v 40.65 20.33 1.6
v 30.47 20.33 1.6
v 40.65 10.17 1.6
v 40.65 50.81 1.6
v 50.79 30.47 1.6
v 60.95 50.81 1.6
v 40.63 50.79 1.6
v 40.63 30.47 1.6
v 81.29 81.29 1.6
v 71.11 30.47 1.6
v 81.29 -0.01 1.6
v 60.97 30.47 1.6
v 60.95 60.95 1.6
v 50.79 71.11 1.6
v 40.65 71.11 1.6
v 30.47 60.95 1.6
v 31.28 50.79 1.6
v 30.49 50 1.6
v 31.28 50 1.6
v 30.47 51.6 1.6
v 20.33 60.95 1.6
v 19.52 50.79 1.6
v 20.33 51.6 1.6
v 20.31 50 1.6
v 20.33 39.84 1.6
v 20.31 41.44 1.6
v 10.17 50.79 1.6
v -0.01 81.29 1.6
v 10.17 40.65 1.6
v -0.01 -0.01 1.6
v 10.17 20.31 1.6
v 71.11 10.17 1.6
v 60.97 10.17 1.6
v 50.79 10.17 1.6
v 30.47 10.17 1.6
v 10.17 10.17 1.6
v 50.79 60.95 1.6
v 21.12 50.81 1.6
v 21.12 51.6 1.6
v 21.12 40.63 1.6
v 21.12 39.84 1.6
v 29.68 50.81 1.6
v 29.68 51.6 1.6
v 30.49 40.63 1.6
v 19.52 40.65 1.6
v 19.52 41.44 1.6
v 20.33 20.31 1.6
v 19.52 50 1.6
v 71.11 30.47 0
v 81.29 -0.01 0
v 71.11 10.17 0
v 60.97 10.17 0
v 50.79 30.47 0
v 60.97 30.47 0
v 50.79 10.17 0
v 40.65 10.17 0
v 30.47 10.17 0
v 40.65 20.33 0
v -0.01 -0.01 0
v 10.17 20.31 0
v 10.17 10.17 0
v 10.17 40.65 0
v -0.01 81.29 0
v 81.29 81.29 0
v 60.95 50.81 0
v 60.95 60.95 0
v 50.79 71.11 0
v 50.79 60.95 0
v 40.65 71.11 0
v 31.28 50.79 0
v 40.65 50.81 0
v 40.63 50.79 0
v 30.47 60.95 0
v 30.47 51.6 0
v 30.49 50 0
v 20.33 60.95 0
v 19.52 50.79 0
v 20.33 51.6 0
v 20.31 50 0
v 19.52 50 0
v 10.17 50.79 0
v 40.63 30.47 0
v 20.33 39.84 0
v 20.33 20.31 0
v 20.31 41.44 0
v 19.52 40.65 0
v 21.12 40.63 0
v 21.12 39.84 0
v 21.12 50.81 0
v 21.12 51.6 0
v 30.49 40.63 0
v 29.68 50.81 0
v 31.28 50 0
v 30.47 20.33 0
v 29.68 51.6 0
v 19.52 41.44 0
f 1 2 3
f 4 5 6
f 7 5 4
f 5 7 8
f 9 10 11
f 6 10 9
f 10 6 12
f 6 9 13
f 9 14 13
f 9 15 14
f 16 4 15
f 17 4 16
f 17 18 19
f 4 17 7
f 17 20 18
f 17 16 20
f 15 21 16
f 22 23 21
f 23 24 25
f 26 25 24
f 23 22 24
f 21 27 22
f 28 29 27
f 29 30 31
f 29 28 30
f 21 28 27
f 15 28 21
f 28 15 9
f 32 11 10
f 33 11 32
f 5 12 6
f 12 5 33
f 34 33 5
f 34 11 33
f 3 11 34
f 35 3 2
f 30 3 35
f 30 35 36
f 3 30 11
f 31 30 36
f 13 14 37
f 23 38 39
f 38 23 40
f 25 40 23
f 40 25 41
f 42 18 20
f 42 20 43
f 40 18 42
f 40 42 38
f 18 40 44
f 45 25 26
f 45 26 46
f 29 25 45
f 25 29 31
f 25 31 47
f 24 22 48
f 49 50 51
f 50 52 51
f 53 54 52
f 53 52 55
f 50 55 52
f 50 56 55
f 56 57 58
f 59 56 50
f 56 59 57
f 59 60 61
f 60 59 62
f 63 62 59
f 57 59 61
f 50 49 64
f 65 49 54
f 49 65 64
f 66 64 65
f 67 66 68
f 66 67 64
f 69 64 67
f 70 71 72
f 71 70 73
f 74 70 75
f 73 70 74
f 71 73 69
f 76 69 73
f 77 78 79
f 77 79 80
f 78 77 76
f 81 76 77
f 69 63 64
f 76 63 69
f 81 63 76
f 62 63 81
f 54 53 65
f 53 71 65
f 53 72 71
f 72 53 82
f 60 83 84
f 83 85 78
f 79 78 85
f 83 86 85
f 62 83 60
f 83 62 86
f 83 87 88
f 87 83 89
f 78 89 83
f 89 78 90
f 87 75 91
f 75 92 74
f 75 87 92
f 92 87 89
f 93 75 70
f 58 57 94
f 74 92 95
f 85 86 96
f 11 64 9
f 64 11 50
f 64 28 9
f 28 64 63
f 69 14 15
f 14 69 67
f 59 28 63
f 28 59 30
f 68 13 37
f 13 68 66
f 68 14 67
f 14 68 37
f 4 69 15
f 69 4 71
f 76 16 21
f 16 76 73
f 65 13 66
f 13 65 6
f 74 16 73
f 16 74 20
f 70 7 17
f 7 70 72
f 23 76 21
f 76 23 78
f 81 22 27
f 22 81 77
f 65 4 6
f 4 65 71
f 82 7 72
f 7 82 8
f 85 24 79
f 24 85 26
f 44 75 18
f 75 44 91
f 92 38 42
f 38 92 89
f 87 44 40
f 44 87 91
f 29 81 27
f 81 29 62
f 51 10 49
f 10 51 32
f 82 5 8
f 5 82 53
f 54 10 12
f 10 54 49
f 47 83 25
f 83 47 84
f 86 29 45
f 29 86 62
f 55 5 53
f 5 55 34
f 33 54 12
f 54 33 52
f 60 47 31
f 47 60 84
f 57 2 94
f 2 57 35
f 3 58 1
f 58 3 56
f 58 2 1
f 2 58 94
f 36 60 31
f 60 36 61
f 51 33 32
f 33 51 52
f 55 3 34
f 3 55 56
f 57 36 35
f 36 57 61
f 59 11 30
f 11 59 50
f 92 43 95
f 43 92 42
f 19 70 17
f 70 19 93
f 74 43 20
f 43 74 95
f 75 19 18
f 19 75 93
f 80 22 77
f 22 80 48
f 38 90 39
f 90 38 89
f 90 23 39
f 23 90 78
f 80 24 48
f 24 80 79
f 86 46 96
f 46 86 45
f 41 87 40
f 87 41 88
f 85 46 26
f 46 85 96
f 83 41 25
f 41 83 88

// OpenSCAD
// The scope's AprilTag (36h11, id 0) as a 3D print: the BLACK cells only,
// one connected piece, to lay on a white background (2026-10-29).
//
// Same tag as the paper one on the scope: 4" (101.6 mm) including its one
// module of white quiet zone, so 10 modules of 10.16 mm, and this part -- the
// 8 x 8 black region -- is 81.28 mm square. The white quiet zone is the
// background you lay it on: leave at least one module (10.16 mm) of white
// showing on every side, or the detector cannot find the tag's outline.
//
// One piece: the border ring and every black data cell already touch along
// an edge, except the cell at row 3, column 5 (row 0 = top), which meets its
// neighbors only at corners. A small square patch sits on each of its three
// shared corners. The detector ignores the outer 13% of every cell when it
// reads it (OpenCV's perspectiveRemoveIgnoredMarginPerCell = 0.13, 1.32 mm
// here), and a 1.6 mm patch reaches only 0.8 mm into the white cells beside
// it, so the decode does not see it. Verified by rendering this geometry and
// decoding it as id 0 (scripts/scope_tag_scad_check.py).
//
// Printing:
//   * Black filament that is black in the NEAR INFRARED. The inside camera
//     reads this tag under its IR illuminator most of the night, and some
//     black dyes are close to transparent there -- the tag looks perfect by
//     day and vanishes after dark. Check a test square under the camera at
//     night before you mount it.
//   * Matte face: print the face that will show DOWN on a textured sheet, or
//     on the bare bed and scuff it lightly. A glossy top throws the
//     illuminator's highlight straight back at the lens.
//   * The pattern is not mirror-symmetric. If you print it face down, the
//     printed part is already the right way round when you flip it over --
//     mirror_for_face_down below does that for you.

tag_size  = 101.6;            // whole tag including the white quiet zone (4")
modules   = 10;               // 8 tag modules + 1 quiet module each side
module_mm = tag_size / modules;   // 10.16
thickness = 1.6;              // mm
patch     = 1.6;              // corner patch, mm (keep under 2 x 1.32)
mirror_for_face_down = true;  // true when the visible face prints on the bed
eps = 0.01;                   // overlap so touching cells fuse into one solid

// 1 = black, row 0 at the TOP as the tag is seen; tag 36h11 id 0.
bits = [
  [1,1,1,1,1,1,1,1],
  [1,1,1,0,1,1,1,1],
  [1,1,0,0,1,0,1,1],
  [1,1,1,1,0,1,0,1],
  [1,1,1,1,0,0,1,1],
  [1,0,1,0,0,0,1,1],
  [1,0,1,0,1,0,0,1],
  [1,1,1,1,1,1,1,1],
];

// Lattice corners [row, col] (row 0 = top edge) that get a patch.
corner_patches = [[3,5], [3,6], [4,6]];

N = len(bits);

module cell(r, c) {
  // x right, y up; row 0 at the top
  translate([c * module_mm - eps, (N - 1 - r) * module_mm - eps, 0])
    cube([module_mm + 2 * eps, module_mm + 2 * eps, thickness]);
}

module corner_patch(r, c) {
  translate([c * module_mm - patch / 2, (N - r) * module_mm - patch / 2, 0])
    cube([patch, patch, thickness]);
}

module tag_black() {
  union() {
    for (r = [0 : N - 1], c = [0 : N - 1])
      if (bits[r][c] == 1) cell(r, c);
    for (p = corner_patches) corner_patch(p[0], p[1]);
  }
}

if (mirror_for_face_down)
  translate([N * module_mm, 0, 0]) mirror([1, 0, 0]) tag_black();
else
  tag_black();
